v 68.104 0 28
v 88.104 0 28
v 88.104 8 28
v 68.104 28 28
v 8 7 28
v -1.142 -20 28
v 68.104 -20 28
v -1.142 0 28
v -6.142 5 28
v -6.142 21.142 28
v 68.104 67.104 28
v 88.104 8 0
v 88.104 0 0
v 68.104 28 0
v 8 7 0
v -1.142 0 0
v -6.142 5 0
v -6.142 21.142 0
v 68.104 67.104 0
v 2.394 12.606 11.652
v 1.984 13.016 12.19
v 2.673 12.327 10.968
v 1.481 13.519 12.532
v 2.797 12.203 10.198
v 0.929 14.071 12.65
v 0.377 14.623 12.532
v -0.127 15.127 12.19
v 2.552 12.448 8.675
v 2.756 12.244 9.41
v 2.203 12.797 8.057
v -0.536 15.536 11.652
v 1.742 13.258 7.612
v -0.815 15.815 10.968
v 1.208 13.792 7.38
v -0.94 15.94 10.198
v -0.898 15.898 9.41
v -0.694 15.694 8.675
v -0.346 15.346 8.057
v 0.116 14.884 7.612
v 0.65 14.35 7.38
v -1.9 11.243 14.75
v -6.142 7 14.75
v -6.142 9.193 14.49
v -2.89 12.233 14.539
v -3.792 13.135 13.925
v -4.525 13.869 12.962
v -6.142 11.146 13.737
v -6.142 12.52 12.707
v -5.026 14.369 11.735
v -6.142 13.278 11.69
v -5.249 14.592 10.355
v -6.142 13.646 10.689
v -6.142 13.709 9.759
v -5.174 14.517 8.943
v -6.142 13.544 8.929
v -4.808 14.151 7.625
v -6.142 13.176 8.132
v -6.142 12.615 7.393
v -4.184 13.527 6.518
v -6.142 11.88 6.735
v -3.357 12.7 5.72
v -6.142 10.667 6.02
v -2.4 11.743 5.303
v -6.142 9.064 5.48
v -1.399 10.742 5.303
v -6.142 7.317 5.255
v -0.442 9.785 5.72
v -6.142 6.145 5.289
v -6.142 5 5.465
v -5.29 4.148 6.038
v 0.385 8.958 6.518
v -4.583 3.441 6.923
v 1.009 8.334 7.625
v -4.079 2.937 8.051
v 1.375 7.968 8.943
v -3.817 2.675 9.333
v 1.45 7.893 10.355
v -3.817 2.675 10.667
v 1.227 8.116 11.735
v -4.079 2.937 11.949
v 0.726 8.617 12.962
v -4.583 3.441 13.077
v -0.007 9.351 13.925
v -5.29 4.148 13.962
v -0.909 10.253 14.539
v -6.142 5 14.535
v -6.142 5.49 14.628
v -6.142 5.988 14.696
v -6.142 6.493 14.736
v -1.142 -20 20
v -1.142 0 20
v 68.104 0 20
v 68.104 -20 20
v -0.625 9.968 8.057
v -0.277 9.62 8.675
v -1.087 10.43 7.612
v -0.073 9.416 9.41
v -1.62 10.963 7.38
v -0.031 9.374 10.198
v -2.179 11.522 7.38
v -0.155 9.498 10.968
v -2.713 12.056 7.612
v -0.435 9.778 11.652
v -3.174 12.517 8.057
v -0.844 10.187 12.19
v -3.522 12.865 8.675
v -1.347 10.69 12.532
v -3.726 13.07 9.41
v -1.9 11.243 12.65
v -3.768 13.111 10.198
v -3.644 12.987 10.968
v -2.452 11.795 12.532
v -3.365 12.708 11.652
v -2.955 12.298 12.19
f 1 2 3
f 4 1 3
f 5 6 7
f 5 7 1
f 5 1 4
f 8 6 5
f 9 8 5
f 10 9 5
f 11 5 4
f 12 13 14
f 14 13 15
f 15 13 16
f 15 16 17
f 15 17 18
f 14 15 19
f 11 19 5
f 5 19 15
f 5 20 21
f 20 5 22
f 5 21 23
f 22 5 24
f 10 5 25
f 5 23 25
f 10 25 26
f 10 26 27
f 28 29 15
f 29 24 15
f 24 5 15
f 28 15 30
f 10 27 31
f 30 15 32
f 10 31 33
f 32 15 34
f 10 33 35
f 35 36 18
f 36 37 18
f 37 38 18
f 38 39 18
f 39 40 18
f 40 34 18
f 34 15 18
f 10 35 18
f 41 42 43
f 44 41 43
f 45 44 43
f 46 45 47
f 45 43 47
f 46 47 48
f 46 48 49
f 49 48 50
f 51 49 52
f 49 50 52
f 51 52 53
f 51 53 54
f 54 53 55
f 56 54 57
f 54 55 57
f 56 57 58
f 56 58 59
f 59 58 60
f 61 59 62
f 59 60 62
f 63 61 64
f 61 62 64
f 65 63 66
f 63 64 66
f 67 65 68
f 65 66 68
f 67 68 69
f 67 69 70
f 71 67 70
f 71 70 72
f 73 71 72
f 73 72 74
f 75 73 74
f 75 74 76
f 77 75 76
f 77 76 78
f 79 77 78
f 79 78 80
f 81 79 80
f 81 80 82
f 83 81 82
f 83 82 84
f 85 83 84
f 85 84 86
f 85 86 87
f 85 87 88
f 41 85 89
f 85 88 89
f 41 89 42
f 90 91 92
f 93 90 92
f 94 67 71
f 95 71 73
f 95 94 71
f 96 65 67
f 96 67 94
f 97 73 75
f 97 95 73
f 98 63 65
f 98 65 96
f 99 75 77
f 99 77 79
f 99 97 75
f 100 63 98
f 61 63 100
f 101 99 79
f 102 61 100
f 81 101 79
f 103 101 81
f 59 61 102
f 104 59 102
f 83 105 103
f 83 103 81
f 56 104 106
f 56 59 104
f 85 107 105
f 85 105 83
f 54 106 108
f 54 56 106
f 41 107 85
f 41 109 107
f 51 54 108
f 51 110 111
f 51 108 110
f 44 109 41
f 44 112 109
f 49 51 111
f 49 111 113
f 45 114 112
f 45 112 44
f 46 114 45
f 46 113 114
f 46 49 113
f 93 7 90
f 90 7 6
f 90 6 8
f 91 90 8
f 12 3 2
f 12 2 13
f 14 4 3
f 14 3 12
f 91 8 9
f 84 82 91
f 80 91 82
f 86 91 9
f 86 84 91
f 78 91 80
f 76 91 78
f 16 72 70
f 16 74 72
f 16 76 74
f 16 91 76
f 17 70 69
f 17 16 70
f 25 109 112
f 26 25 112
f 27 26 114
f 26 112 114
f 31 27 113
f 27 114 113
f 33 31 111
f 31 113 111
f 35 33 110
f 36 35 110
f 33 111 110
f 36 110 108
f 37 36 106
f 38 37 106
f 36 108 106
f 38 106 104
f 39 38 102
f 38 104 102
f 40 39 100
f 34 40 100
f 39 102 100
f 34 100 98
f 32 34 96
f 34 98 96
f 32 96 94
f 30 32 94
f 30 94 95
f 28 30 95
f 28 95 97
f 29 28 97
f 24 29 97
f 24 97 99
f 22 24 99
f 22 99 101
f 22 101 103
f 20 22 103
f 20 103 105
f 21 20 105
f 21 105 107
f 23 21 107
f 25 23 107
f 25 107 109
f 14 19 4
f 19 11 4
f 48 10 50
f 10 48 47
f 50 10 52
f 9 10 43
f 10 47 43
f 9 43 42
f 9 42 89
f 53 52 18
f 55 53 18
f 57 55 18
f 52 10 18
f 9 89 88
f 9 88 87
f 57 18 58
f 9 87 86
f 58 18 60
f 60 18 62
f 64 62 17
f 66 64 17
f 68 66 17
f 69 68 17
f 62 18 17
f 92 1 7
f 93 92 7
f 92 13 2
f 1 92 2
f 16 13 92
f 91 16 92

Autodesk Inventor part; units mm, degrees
ref_plane "YZ Plane" through (0, 0, 0) normal (1, 0, 0) x (0, 1, 0)
sketch "スケッチ1" plane through (0, 0, 0) normal (0, 0, 1) x (1, 0, 0)
  line L0 (0, 0) -> (8, 0)
  line L1 (8, 0) -> (8, 7)
  line L2 (8, 7) -> (0, 7)
  line L3 (0, 7) -> (0, 0)
  line L4 (8, 7) -> (68.1041, 67.1041)
  line L5 (68.1041, 67.1041) -> (68.1041, 0)
  line L6 (68.1041, 0) -> (-2.6124, 0)
  dimension "d0" = 8
  dimension "d1" = 7
  dimension "d3" = 85
  dimension "d245" = 45
extrude "押し出し1" add sketch "スケッチ1" along normal blind 20
sketch "スケッチ15" plane through (0, 0, 20) normal (0, 0, 1) x (1, 0, 0)
  line L0 (68.1041, 67.1041) -> (8, 7) projected
  line L1 (8, 7) -> (0, 7) projected
  line L2 (0, 7) -> (0, 0) projected
  line L3 (8, 7) -> (-6.1421, 21.1421)
  line L4 (-6.1421, 21.1421) -> (-6.1421, 0)
  line L5 (-6.1421, 0) -> (0, 0)
  dimension "d92" = 20
extrude "押し出し10" add sketch "スケッチ15" against normal up to surface (20 mm away)
chamfer "面取り7" distance 5 angle 45 1 edges at (-6.1421, 0, 10)
sketch "スケッチ16" plane through (-6.1421, 21.1421, 20) normal (0.7071068, 0.7071068, 0) x (0, 0, -1)
  point P0 (20, -19.2929)
  point P1 (10, -10)
hole "穴6" at (0.9289, 14.0711, 10) direction (-0.7071068, -0.7071068, 0) diameter 5.3 depth 58
ref_plane "作業平面2" through (-8.9706, 18.3137, 20) normal (0.7071068, 0.7071068, 0) x (0, 0, -1)
sketch "スケッチ17" plane through (-8.9706, 18.3137, 20) normal (0.7071068, 0.7071068, 0) x (0, 0, -1)
  arc A0 (12.2411, -11.4142) -> (7.7589, -11.4142) centre (10, -10) ccw projected
  point P0 (20, -19.2929)
hole "穴7" at (-1.8995, 11.2426, 10) direction (-0.7071068, -0.7071068, 0) diameter 9.5 depth 58
sketch "スケッチ18" plane through (68.1041, 67.1041, 20) normal (-0.7071068, 0.7071068, 0) x (0.7071068, 0.7071068, 0)
  line L0 (0, 20) -> (-85, 20) projected
  line L1 (-85, 20) -> (-85, 0) projected
  line L2 (0, 20) -> (0, 0) projected
  point P0 (-95.6066, 20)
  point P1 (-75, 10)
  point P2 (-42.5, 10)
  point P3 (-10, 10)
  dimension "d119" = 10
  dimension "d120" = 10
  dimension "d121" = 10
  dimension "d122" = 32.5
hole "穴8" [suppressed]
ref_plane "作業平面3" through (72.3467, 62.8614, 20) normal (-0.7071068, 0.7071068, 0) x (0.7071068, 0.7071068, 0)
sketch "スケッチ19" plane through (72.3467, 62.8614, 20) normal (-0.7071068, 0.7071068, 0) x (0.7071068, 0.7071068, 0)
  line L0 (0, 20) -> (-85, 20) projected
  line L1 (-85, 20) -> (-85, 0) projected
  line L2 (0, 0) -> (-85, 0) projected
  line L3 (0, 20) -> (0, 0) projected
  point P0 (-95.6066, 20)
hole "穴9" [suppressed]
sketch "スケッチ20" plane through (0, 0, 20) normal (0, 0, 1) x (1, 0, 0)
  line L0 (68.1041, 0) -> (68.1041, 67.1041) projected
  line L1 (68.1041, 67.1041) -> (8, 7) projected
  line L2 (-6.1421, 21.1421) -> (-6.1421, 0) projected
  line L3 (68.1041, 67.1041) -> (8, 7)
  line L4 (8, 7) -> (-6.1421, 21.1421)
  line L5 (-6.1421, 21.1421) -> (53.9619, 81.2462)
  line L6 (53.9619, 81.2462) -> (68.1041, 67.1041)
  line L7 (-5.2583, 14.6014) -> (1.4593, 7.8839) projected
  line L8 (-1.1421, 0) -> (-6.1421, 5) projected
  line L9 (-1.1421, 0) -> (68.1041, 0) projected
  line L10 (68.1041, 0) -> (68.1041, 67.1041) projected
  line L11 (68.1041, 67.1041) -> (8, 7) projected
  line L12 (8, 7) -> (-6.1421, 21.1421) projected
  line L13 (-6.1421, 21.1421) -> (-6.1421, 5) projected
  point P0 (-3.4715, 23.383)
  point P1 (-3.4715, 23.383)
  point P2 (-6.1421, 0)
extrude "押し出し11" add sketch "スケッチ20" along normal blind 8 contours L9 L8 L2 L4 L1 L0
sketch "スケッチ21" plane through (0, 0, 28) normal (0, 0, 1) x (1, 0, 0)
  line L0 (68.1041, 67.1041) -> (8, 7) projected
  line L1 (8, 7) -> (-6.1421, 21.1421) projected
  line L2 (-6.1421, 21.1421) -> (-6.1421, 5) projected
  line L3 (-6.1421, 5) -> (-1.1421, 0) projected
  line L4 (-1.1421, 0) -> (68.1041, 0) projected
  line L5 (68.1041, 0) -> (68.1041, 67.1041) projected
  line L6 (-1.1421, 0) -> (68.1041, 0)
  line L7 (68.1041, 0) -> (68.1041, -20)
  line L8 (68.1041, -20) -> (-1.1421, -20)
  line L9 (-1.1421, -20) -> (-1.1421, 0)
  dimension "d247" = 20
extrude "押し出し12" add sketch "スケッチ21" against normal blind 8 contours L7 L8 L9 L4
sketch "スケッチ23" plane through (68.1041, 0, 0) normal (1, 0, 0) x (0, 0, -1)
  line L0 (0, 0) -> (0, 67.1041) projected
  line L1 (0, 0) -> (-20, 0)
  line L2 (0, 0) -> (-28, 0)
  line L3 (-28, 0) -> (-28, 8)
  line L4 (-28, 8) -> (0, 8)
  line L5 (0, 8) -> (0, 0)
  point P0 (-28, 55.754)
  point P1 (0, 8)
extrude "押し出し13" add sketch "スケッチ23" along normal blind 20
chamfer "面取り8" distance 20 angle 45 1 edges at (68.1041, 8, 14)
sketch "スケッチ24" plane through (1.5285, 0, 20) normal (0, -1, 0) x (1, 0, 0)
  line L0 (96.0995, -20) -> (0, -20) projected
  line L1 (96.0995, 8) -> (96.0995, -20) projected
  point P0 (-1.5285, -20)
  point P1 (86.0995, -10)
  dimension "d161" = 10
  dimension "d162" = 10
hole "穴11" [suppressed]
sketch "スケッチ25" plane through (1.5285, 6, 20) normal (0, -1, 0) x (1, 0, 0)
  circle A0 centre (86.0995, -10) radius 2.15 projected
  point P0 (-1.5285, -20)
sketch "スケッチ27" plane through (0, 0, 28) normal (0, 0, 1) x (1, 0, 0)
  line L0 (68.1041, -20) -> (68.1041, 0) projected
  line L1 (77.6279, 0) -> (97.6279, 0) projected
  line L2 (77.6279, -20) -> (1.5285, -20) projected
  line L3 (97.6279, 0) -> (1.5285, 0) projected
  line L4 (77.6279, -20) -> (97.6279, -20)
  line L5 (97.6279, -20) -> (97.6279, 0)
  line L6 (97.6279, 0) -> (77.6279, 0)
  line L7 (77.6279, 0) -> (77.6279, -20)
  point P0 (0, 0)
sketch "スケッチ22" plane through (0, 0, 28) normal (0, 0, 1) x (1, 0, 0)
  line L0 (1.5285, 0) -> (1.5285, -20) projected
  line L1 (1.5285, -20) -> (77.6279, -20) projected
  line L2 (97.6279, 8) -> (97.6279, -20) projected
  point P0 (0, 0)
  point P1 (11.5285, -10)
  point P2 (36.895, -10)
  point P3 (62.2614, -10)
  point P4 (87.6279, -10)
  dimension "d143" = 10
  dimension "d144" = 10
  dimension "d185" = 10
  dimension "d186" = 76.0995
  dimension "d187" = 25.3665
  dimension "d188" = 25.3665
sketch "スケッチ28" plane through (0, 0, 20) normal (0, 0, -1) x (-1, 0, 0)
  line L0 (-77.6279, 55.754) -> (-71.9329, 63.8873) projected
  line L1 (-77.6279, 55.754) -> (-8, 7) projected
  line L2 (-8, 7) -> (3.4715, 23.383) projected
  line L3 (-2.2642, 15.1915) -> (-101.3499, 84.572)
  line L4 (-68.1041, 67.1041) -> (-8, 7) projected
  line L5 (-39.5723, 38.5723) -> (-36.5318, 35.5318) projected
  line L6 (-16.5913, 15.5913) -> (-13.5508, 12.5508) projected
  line L7 (-62.5533, 61.5533) -> (-59.5127, 58.5127) projected
  line L8 (-70.2375, 50.5791) -> (-66.7686, 48.1502) projected
  line L9 (-68.1041, 67.1041) -> (-8, 7) projected
  point P0 (0, 0)
  point P1 (-10.4558, 20.9273)
  point P2 (-37.0782, 39.5685)
  point P3 (-63.7006, 58.2098)
  dimension "d196" = 10
  dimension "d197" = 32.5
  dimension "d198" = 65
sketch "スケッチ29" plane through (0, 0, 28) normal (0, 0, 1) x (1, 0, 0)
  circle A0 centre (37.0782, 39.5685) radius 2.15 projected
  circle A1 centre (10.4558, 20.9273) radius 2.15 projected
  circle A2 centre (63.7006, 58.2098) radius 2.15 projected
  point P0 (0, 0)
sketch "スケッチ30" plane through (0, 0, 28) normal (0, 0, 1) x (1, 0, 0)
  circle A0 centre (10.4558, 20.9273) radius 4 projected
  point P0 (0, 0)
sketch "スケッチ31" plane through (1.5285, 0, 0) normal (0, -1, 0) x (1, 0, 0)
  ellipse E0 centre (23.5807, 10) end of major axis (28.4638, 10) minor radius 4 projected
  ellipse E1 centre (63.2559, 10) end of major axis (68.139, 10) minor radius 4 projected
  circle A0 centre (86.0995, 10) radius 2.15 projected
  line L0 (96.0995, 20) -> (96.0995, 0) projected
  line L1 (0, 0) -> (0, 20) projected
  line L2 (96.0995, 7.1) -> (0, 7.1)
  line L3 (0, 7.1) -> (0, 12.9)
  line L4 (0, 12.9) -> (96.0995, 12.9)
  line L5 (96.0995, 12.9) -> (96.0995, 7.1)
  line L6 (51.228, 7.1) -> (36.228, 7.1)
  line L7 (36.228, 7.1) -> (36.228, 12.9)
  line L8 (36.228, 12.9) -> (51.228, 12.9)
  line L9 (51.228, 12.9) -> (51.228, 7.1)
  line L10 (9.7875, 12.9) -> (0, 12.9)
  line L11 (0, 12.9) -> (0, 7.1)
  line L12 (0, 7.1) -> (9.7875, 7.1)
  line L13 (9.7875, 7.1) -> (9.7875, 12.9)
  line L14 (76.0995, 7.1) -> (71.0995, 7.1)
  line L15 (71.0995, 7.1) -> (71.0995, 12.9)
  line L16 (71.0995, 12.9) -> (76.0995, 12.9)
  line L17 (76.0995, 12.9) -> (76.0995, 7.1)
  point P0 (96.0995, 2)
  point P1 (-1.5285, 0)
  point P2 (0, 7.1)
  point P3 (20.2175, 7.1)
  point P4 (20.2175, 12.9)
  point P5 (59.8927, 7.1)
  point P6 (59.8927, 12.9)
  point P7 (26.944, 12.9)
  point P8 (26.944, 7.1)
  point P9 (76.0995, 12.9)
  point P10 (66.6191, 12.9)
  point P11 (66.6191, 7.1)
  dimension "d220" = 5.8
  dimension "d221" = 2.9
  dimension "d223" = 15
  dimension "d224" = 10
sketch "スケッチ33" plane through (42.2947, 32.8094, 10) normal (0.7071068, -0.7071068, 0) x (0, 0, 1)
  circle A0 centre (0, 0) radius 4 projected
  circle A1 centre (0, 32.5) radius 2.15 projected
  circle A2 centre (0, 32.5) radius 4 projected
  point P0 (-10, 53.1066)
sketch "スケッチ34" plane through (87.6279, -10, 24) normal (0, 0, 1) x (1, 0, 0)
  circle A0 centre (0, 0) radius 2.15 projected
  circle A1 centre (-25.3665, 0) radius 4 projected
  circle A2 centre (-25.3665, 0) radius 2.15 projected
  circle A3 centre (-76.0995, 0) radius 2.15 projected
  circle A4 centre (-77.1722, 30.9273) radius 2.65 projected
  circle A5 centre (-50.5497, 49.5685) radius 2.15 projected
  circle A6 centre (-23.9273, 68.2098) radius 2.15 projected
  circle A7 centre (-23.9273, 68.2098) radius 4 projected
  line L0 (2.15, 2.15) -> (-2.15, 2.15)
  line L1 (-2.15, 2.15) -> (-2.15, -2.15)
  line L2 (-2.15, -2.15) -> (2.15, -2.15)
  line L3 (2.15, -2.15) -> (2.15, 2.15)
  line L4 (2.15, 2.15) -> (-2.15, -2.15) construction
  line L5 (-2.15, 2.15) -> (2.15, -2.15) construction
  line L6 (-23.2165, 2.15) -> (-27.5165, 2.15)
  line L7 (-27.5165, 2.15) -> (-27.5165, -2.15)
  line L8 (-27.5165, -2.15) -> (-23.2165, -2.15)
  line L9 (-23.2165, -2.15) -> (-23.2165, 2.15)
  line L10 (-23.2165, 2.15) -> (-27.5165, -2.15) construction
  line L11 (-27.5165, 2.15) -> (-23.2165, -2.15) construction
  line L12 (-73.9495, 2.15) -> (-78.2495, 2.15)
  line L13 (-78.2495, 2.15) -> (-78.2495, -2.15)
  line L14 (-78.2495, -2.15) -> (-73.9495, -2.15)
  line L15 (-73.9495, -2.15) -> (-73.9495, 2.15)
  line L16 (-73.9495, 2.15) -> (-78.2495, -2.15) construction
  line L17 (-78.2495, 2.15) -> (-73.9495, -2.15) construction
  line L18 (-74.5222, 33.5773) -> (-79.8222, 33.5773)
  line L19 (-79.8222, 33.5773) -> (-79.8222, 28.2773)
  line L20 (-79.8222, 28.2773) -> (-74.5222, 28.2773)
  line L21 (-74.5222, 28.2773) -> (-74.5222, 33.5773)
  line L22 (-74.5222, 33.5773) -> (-79.8222, 28.2773) construction
  line L23 (-79.8222, 33.5773) -> (-74.5222, 28.2773) construction
  line L24 (-48.3997, 51.7185) -> (-52.6997, 51.7185)
  line L25 (-52.6997, 51.7185) -> (-52.6997, 47.4185)
  line L26 (-52.6997, 47.4185) -> (-48.3997, 47.4185)
  line L27 (-48.3997, 47.4185) -> (-48.3997, 51.7185)
  line L28 (-48.3997, 51.7185) -> (-52.6997, 47.4185) construction
  line L29 (-52.6997, 51.7185) -> (-48.3997, 47.4185) construction
  line L30 (-21.7773, 70.3598) -> (-26.0773, 70.3598)
  line L31 (-26.0773, 70.3598) -> (-26.0773, 66.0598)
  line L32 (-26.0773, 66.0598) -> (-21.7773, 66.0598)
  line L33 (-21.7773, 66.0598) -> (-21.7773, 70.3598)
  line L34 (-21.7773, 70.3598) -> (-26.0773, 66.0598) construction
  line L35 (-26.0773, 70.3598) -> (-21.7773, 66.0598) construction
  circle A8 centre (-23.9273, 68.2098) radius 2.15 projected
  circle A9 centre (-50.733, 0) radius 2.15 projected
  line L36 (-52.883, 2.15) -> (-48.583, 2.15)
  line L37 (-48.583, 2.15) -> (-48.583, -2.15)
  line L38 (-48.583, -2.15) -> (-52.883, -2.15)
  line L39 (-52.883, -2.15) -> (-52.883, 2.15)
  line L40 (-52.883, 2.15) -> (-48.583, -2.15) construction
  line L41 (-48.583, 2.15) -> (-52.883, -2.15) construction
  point P0 (-87.6279, 10)
sketch "スケッチ35" plane through (87.6279, -10, 24) normal (0, 0, 1) x (1, 0, 0)
  line L0 (2.15, -2.15) -> (-2.15, -2.15) projected
  line L1 (-2.15, 2.15) -> (2.15, 2.15) projected
  circle A0 centre (0, 0) radius 4 projected
  line L2 (-23.2165, 2.15) -> (-23.2165, -2.15) projected
  line L3 (-23.2165, -2.15) -> (-27.5165, -2.15) projected
  line L4 (-27.5165, -2.15) -> (-27.5165, 2.15) projected
  line L5 (-27.5165, 2.15) -> (-23.2165, 2.15) projected
  circle A1 centre (-25.3665, 0) radius 4 projected
  line L6 (-52.883, 2.15) -> (-48.583, 2.15) projected
  line L7 (-48.583, 2.15) -> (-48.583, -2.15) projected
  line L8 (-48.583, -2.15) -> (-52.883, -2.15) projected
  line L9 (-52.883, -2.15) -> (-52.883, 2.15) projected
  circle A2 centre (-50.733, 0) radius 4 projected
  line L10 (-78.2495, 2.15) -> (-73.9495, 2.15) projected
  line L11 (-73.9495, 2.15) -> (-73.9495, -2.15) projected
  line L12 (-73.9495, -2.15) -> (-78.2495, -2.15) projected
  line L13 (-78.2495, -2.15) -> (-78.2495, 2.15) projected
  circle A3 centre (-76.0995, 0) radius 4 projected
  circle A4 centre (-77.1722, 30.9273) radius 4.75 projected
  circle A5 centre (-50.5497, 49.5685) radius 4 projected
  circle A6 centre (-23.9273, 68.2098) radius 4 projected
  line L14 (18.1594, -2.15) -> (-105.0634, -2.15)
  line L15 (-105.0634, -2.15) -> (-105.0634, 2.15)
  line L16 (-105.0634, 2.15) -> (18.1594, 2.15)
  line L17 (18.1594, 2.15) -> (18.1594, -2.15)
  circle A7 centre (-23.9273, 68.2098) radius 4 projected
  line L18 (-21.7773, 71.5828) -> (-26.0773, 71.5828)
  line L19 (-26.0773, 71.5828) -> (-26.0773, 64.8367)
  line L20 (-26.0773, 64.8367) -> (-21.7773, 64.8367)
  line L21 (-21.7773, 64.8367) -> (-21.7773, 71.5828)
  line L22 (-21.7773, 71.5828) -> (-26.0773, 64.8367) construction
  line L23 (-26.0773, 71.5828) -> (-21.7773, 64.8367) construction
  circle A8 centre (-50.5497, 49.5685) radius 4 projected
  line L24 (-52.6997, 46.1955) -> (-48.3997, 46.1955)
  line L25 (-48.3997, 46.1955) -> (-48.3997, 52.9416)
  line L26 (-48.3997, 52.9416) -> (-52.6997, 52.9416)
  line L27 (-52.6997, 52.9416) -> (-52.6997, 46.1955)
  line L28 (-52.6997, 46.1955) -> (-48.3997, 52.9416) construction
  line L29 (-48.3997, 46.1955) -> (-52.6997, 52.9416) construction
  circle A9 centre (-77.1722, 30.9273) radius 4.75 projected
  line L30 (-74.5222, 34.8694) -> (-79.8222, 34.8694)
  line L31 (-79.8222, 34.8694) -> (-79.8222, 26.9852)
  line L32 (-79.8222, 26.9852) -> (-74.5222, 26.9852)
  line L33 (-74.5222, 26.9852) -> (-74.5222, 34.8694)
  line L34 (-74.5222, 34.8694) -> (-79.8222, 26.9852) construction
  line L35 (-79.8222, 34.8694) -> (-74.5222, 26.9852) construction
  point P0 (-87.6279, 10)
  point P1 (-3.3731, 2.15)
  point P2 (-3.3731, -2.15)
  point P3 (3.3731, -2.15)
  point P4 (3.3731, 2.15)
  point P5 (-28.7395, 2.15)
  point P6 (-28.7395, -2.15)
  point P7 (-21.9934, -2.15)
  point P8 (-21.9934, 2.15)
  point P9 (-54.106, 2.15)
  point P10 (-54.106, -2.15)
  point P11 (-47.3599, -2.15)
  point P12 (-47.3599, 2.15)
  point P13 (-72.7264, 2.15)
  point P14 (-79.4725, 2.15)
  point P15 (-79.4725, -2.15)
  point P16 (-72.7264, -2.15)
  point P17 (-48.3997, 52.9416)
  point P18 (-52.6997, 52.9416)
  point P19 (-21.7773, 71.5828)
  point P20 (-26.0773, 71.5828)
equation "\"d187\" = 0.333333 * d186"
equation "\"d188\" = d187"
properties part number "Print_Parts_L1"
